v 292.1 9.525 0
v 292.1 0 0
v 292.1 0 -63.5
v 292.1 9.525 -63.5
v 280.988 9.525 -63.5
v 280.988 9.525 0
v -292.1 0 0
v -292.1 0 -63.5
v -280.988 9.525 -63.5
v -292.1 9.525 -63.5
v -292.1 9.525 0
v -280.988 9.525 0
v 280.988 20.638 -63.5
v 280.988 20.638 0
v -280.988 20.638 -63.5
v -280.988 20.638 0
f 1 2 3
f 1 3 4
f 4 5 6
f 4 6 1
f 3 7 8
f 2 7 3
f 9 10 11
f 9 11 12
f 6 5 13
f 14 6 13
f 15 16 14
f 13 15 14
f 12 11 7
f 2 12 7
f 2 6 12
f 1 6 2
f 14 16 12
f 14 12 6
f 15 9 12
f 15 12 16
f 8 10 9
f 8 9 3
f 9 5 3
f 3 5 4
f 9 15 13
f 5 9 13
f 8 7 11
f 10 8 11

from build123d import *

# Parameters (mm, degrees)
F0_W     = 584.2
F0_H     = 20.6375
F1_DEPTH = 63.5
F2_W     = 11.1125
F2_H     = 11.1125
F3_DEPTH = 63.501


with BuildPart() as f1:
    # F0 (on Top) → F1 (new body)
    with BuildSketch(Plane.XY):
        with Locations((0, 10.31875)):
            Rectangle(F0_W, F0_H)
    extrude(amount=-F1_DEPTH)

    # F2 (on face) → F3 (cut, through all)
    with BuildSketch(Plane.XY):
        with Locations((286.54375, 15.08125)):
            Rectangle(F2_W, F2_H)
        with Locations((-286.54375, 15.08125)):
            Rectangle(F2_W, F2_H)
    extrude(amount=-F3_DEPTH, mode=Mode.SUBTRACT)


solid = f1.part
